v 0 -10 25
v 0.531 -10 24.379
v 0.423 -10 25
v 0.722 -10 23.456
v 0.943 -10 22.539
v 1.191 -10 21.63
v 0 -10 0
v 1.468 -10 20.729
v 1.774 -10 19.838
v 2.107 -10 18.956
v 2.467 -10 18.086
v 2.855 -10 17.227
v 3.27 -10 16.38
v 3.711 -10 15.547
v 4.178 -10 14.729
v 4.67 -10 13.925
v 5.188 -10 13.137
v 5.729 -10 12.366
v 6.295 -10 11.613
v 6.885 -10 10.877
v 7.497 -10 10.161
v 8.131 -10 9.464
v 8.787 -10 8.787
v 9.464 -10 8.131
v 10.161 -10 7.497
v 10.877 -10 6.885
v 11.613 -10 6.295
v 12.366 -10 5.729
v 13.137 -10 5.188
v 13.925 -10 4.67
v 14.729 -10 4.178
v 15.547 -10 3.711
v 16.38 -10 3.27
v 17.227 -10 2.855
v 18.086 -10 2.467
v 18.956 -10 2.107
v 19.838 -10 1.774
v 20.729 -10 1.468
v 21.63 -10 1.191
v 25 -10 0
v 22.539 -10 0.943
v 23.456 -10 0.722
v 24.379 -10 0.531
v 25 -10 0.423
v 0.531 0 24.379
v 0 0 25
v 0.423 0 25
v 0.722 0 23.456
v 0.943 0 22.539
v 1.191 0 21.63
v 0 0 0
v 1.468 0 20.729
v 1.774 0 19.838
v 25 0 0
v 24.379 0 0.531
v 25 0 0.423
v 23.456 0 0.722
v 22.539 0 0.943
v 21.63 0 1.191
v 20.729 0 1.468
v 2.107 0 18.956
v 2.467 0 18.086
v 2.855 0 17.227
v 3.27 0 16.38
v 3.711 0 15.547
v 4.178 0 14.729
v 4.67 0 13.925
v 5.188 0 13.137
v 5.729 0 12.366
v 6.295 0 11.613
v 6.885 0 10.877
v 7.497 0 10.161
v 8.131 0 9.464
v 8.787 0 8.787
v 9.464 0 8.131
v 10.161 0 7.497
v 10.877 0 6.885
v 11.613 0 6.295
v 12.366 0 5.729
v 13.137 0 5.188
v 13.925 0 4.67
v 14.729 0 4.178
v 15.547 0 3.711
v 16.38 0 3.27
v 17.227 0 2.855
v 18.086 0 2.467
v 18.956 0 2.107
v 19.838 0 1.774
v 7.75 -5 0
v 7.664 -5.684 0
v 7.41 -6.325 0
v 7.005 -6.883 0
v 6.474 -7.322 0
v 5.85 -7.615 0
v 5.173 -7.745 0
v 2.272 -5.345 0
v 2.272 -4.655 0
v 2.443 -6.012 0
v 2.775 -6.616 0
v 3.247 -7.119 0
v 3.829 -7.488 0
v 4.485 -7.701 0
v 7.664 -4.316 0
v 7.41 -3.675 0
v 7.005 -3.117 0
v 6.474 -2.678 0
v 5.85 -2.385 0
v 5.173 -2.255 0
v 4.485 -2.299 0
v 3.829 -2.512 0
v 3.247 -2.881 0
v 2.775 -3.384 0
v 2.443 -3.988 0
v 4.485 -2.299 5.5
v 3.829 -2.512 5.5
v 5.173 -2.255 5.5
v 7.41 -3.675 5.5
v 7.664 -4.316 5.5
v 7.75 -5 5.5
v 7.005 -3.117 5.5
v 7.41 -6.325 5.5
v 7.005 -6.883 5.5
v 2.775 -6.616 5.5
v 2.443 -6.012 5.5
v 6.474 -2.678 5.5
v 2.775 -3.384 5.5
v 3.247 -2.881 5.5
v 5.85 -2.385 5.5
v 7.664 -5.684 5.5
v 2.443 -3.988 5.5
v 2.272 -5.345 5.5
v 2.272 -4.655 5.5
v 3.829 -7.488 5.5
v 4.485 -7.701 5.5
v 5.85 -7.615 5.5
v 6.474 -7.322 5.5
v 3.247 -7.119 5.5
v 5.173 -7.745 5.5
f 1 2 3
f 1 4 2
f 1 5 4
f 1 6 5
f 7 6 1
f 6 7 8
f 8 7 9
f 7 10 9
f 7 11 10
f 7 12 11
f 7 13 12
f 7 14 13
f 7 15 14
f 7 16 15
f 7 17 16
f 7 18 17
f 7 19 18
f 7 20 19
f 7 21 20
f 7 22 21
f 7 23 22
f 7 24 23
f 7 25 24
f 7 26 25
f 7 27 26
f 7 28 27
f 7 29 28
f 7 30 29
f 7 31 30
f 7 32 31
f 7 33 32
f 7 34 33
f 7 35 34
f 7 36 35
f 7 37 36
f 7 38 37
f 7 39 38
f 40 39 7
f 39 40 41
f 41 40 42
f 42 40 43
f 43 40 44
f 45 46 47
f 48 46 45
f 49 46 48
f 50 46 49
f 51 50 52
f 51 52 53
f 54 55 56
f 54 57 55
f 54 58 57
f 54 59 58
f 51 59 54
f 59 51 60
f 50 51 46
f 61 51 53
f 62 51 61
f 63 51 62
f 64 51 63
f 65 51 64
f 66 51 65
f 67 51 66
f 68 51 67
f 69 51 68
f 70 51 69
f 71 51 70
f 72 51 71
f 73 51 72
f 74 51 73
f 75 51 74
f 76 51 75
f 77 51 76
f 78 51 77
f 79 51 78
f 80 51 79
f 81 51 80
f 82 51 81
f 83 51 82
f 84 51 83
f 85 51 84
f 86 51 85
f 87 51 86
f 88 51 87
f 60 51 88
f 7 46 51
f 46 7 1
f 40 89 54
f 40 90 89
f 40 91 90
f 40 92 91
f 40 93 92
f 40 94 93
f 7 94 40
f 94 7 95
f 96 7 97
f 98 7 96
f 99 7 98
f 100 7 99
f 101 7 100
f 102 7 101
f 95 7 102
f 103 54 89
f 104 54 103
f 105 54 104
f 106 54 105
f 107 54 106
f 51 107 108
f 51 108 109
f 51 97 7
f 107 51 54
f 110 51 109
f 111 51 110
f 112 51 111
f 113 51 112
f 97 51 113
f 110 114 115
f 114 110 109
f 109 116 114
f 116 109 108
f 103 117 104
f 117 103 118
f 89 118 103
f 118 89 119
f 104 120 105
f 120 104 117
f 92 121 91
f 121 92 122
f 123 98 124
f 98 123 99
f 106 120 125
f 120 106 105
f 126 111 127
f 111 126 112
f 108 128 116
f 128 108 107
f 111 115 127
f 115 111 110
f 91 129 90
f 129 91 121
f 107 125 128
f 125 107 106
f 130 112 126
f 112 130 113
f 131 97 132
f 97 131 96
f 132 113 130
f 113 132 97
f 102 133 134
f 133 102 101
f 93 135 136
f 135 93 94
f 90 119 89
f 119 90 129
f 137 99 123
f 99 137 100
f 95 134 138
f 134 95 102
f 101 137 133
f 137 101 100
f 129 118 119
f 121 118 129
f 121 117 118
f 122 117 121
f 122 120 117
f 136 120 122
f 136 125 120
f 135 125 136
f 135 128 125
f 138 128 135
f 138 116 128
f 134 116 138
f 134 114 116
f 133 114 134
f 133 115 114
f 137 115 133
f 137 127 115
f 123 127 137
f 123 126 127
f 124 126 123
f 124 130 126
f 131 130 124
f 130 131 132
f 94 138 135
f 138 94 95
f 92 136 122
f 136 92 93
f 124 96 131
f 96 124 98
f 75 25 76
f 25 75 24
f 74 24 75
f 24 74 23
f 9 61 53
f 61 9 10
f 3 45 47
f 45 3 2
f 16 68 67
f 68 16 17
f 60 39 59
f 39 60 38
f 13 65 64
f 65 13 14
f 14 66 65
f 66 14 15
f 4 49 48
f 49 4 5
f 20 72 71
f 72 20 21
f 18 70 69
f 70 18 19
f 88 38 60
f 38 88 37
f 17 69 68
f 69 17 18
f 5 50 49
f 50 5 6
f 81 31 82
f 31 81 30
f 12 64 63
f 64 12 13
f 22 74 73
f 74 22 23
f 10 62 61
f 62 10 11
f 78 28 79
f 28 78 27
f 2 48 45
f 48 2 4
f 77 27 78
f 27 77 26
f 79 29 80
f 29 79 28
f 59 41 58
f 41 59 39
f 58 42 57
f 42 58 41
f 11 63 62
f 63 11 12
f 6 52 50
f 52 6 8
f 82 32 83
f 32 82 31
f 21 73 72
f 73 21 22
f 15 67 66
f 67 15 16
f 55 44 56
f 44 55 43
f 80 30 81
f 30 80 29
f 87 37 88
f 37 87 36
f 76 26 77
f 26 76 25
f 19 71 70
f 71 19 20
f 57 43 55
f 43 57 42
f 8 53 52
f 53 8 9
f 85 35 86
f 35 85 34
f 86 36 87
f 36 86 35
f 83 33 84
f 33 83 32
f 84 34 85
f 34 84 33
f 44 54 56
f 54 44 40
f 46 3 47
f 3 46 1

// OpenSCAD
eps=0.01;

module support()
{
  rotate([90, 0, 0])
    intersection()
    {
      difference()
      {
        cube([30, 30, 10]);
        // magnet hole
        translate([5, -eps, 10/2])
          rotate([-90, 0, 0])
            cylinder(d=5+0.5, h=5+0.5+eps, $fn=25);
        // main rounding
        translate([30, 30, -eps])
          cylinder(r=30, h=10+2*eps, $fn=200);
      }
      // truncating sharp edges
      cube([25, 25, 10+2*eps]);
    }
}


support();
